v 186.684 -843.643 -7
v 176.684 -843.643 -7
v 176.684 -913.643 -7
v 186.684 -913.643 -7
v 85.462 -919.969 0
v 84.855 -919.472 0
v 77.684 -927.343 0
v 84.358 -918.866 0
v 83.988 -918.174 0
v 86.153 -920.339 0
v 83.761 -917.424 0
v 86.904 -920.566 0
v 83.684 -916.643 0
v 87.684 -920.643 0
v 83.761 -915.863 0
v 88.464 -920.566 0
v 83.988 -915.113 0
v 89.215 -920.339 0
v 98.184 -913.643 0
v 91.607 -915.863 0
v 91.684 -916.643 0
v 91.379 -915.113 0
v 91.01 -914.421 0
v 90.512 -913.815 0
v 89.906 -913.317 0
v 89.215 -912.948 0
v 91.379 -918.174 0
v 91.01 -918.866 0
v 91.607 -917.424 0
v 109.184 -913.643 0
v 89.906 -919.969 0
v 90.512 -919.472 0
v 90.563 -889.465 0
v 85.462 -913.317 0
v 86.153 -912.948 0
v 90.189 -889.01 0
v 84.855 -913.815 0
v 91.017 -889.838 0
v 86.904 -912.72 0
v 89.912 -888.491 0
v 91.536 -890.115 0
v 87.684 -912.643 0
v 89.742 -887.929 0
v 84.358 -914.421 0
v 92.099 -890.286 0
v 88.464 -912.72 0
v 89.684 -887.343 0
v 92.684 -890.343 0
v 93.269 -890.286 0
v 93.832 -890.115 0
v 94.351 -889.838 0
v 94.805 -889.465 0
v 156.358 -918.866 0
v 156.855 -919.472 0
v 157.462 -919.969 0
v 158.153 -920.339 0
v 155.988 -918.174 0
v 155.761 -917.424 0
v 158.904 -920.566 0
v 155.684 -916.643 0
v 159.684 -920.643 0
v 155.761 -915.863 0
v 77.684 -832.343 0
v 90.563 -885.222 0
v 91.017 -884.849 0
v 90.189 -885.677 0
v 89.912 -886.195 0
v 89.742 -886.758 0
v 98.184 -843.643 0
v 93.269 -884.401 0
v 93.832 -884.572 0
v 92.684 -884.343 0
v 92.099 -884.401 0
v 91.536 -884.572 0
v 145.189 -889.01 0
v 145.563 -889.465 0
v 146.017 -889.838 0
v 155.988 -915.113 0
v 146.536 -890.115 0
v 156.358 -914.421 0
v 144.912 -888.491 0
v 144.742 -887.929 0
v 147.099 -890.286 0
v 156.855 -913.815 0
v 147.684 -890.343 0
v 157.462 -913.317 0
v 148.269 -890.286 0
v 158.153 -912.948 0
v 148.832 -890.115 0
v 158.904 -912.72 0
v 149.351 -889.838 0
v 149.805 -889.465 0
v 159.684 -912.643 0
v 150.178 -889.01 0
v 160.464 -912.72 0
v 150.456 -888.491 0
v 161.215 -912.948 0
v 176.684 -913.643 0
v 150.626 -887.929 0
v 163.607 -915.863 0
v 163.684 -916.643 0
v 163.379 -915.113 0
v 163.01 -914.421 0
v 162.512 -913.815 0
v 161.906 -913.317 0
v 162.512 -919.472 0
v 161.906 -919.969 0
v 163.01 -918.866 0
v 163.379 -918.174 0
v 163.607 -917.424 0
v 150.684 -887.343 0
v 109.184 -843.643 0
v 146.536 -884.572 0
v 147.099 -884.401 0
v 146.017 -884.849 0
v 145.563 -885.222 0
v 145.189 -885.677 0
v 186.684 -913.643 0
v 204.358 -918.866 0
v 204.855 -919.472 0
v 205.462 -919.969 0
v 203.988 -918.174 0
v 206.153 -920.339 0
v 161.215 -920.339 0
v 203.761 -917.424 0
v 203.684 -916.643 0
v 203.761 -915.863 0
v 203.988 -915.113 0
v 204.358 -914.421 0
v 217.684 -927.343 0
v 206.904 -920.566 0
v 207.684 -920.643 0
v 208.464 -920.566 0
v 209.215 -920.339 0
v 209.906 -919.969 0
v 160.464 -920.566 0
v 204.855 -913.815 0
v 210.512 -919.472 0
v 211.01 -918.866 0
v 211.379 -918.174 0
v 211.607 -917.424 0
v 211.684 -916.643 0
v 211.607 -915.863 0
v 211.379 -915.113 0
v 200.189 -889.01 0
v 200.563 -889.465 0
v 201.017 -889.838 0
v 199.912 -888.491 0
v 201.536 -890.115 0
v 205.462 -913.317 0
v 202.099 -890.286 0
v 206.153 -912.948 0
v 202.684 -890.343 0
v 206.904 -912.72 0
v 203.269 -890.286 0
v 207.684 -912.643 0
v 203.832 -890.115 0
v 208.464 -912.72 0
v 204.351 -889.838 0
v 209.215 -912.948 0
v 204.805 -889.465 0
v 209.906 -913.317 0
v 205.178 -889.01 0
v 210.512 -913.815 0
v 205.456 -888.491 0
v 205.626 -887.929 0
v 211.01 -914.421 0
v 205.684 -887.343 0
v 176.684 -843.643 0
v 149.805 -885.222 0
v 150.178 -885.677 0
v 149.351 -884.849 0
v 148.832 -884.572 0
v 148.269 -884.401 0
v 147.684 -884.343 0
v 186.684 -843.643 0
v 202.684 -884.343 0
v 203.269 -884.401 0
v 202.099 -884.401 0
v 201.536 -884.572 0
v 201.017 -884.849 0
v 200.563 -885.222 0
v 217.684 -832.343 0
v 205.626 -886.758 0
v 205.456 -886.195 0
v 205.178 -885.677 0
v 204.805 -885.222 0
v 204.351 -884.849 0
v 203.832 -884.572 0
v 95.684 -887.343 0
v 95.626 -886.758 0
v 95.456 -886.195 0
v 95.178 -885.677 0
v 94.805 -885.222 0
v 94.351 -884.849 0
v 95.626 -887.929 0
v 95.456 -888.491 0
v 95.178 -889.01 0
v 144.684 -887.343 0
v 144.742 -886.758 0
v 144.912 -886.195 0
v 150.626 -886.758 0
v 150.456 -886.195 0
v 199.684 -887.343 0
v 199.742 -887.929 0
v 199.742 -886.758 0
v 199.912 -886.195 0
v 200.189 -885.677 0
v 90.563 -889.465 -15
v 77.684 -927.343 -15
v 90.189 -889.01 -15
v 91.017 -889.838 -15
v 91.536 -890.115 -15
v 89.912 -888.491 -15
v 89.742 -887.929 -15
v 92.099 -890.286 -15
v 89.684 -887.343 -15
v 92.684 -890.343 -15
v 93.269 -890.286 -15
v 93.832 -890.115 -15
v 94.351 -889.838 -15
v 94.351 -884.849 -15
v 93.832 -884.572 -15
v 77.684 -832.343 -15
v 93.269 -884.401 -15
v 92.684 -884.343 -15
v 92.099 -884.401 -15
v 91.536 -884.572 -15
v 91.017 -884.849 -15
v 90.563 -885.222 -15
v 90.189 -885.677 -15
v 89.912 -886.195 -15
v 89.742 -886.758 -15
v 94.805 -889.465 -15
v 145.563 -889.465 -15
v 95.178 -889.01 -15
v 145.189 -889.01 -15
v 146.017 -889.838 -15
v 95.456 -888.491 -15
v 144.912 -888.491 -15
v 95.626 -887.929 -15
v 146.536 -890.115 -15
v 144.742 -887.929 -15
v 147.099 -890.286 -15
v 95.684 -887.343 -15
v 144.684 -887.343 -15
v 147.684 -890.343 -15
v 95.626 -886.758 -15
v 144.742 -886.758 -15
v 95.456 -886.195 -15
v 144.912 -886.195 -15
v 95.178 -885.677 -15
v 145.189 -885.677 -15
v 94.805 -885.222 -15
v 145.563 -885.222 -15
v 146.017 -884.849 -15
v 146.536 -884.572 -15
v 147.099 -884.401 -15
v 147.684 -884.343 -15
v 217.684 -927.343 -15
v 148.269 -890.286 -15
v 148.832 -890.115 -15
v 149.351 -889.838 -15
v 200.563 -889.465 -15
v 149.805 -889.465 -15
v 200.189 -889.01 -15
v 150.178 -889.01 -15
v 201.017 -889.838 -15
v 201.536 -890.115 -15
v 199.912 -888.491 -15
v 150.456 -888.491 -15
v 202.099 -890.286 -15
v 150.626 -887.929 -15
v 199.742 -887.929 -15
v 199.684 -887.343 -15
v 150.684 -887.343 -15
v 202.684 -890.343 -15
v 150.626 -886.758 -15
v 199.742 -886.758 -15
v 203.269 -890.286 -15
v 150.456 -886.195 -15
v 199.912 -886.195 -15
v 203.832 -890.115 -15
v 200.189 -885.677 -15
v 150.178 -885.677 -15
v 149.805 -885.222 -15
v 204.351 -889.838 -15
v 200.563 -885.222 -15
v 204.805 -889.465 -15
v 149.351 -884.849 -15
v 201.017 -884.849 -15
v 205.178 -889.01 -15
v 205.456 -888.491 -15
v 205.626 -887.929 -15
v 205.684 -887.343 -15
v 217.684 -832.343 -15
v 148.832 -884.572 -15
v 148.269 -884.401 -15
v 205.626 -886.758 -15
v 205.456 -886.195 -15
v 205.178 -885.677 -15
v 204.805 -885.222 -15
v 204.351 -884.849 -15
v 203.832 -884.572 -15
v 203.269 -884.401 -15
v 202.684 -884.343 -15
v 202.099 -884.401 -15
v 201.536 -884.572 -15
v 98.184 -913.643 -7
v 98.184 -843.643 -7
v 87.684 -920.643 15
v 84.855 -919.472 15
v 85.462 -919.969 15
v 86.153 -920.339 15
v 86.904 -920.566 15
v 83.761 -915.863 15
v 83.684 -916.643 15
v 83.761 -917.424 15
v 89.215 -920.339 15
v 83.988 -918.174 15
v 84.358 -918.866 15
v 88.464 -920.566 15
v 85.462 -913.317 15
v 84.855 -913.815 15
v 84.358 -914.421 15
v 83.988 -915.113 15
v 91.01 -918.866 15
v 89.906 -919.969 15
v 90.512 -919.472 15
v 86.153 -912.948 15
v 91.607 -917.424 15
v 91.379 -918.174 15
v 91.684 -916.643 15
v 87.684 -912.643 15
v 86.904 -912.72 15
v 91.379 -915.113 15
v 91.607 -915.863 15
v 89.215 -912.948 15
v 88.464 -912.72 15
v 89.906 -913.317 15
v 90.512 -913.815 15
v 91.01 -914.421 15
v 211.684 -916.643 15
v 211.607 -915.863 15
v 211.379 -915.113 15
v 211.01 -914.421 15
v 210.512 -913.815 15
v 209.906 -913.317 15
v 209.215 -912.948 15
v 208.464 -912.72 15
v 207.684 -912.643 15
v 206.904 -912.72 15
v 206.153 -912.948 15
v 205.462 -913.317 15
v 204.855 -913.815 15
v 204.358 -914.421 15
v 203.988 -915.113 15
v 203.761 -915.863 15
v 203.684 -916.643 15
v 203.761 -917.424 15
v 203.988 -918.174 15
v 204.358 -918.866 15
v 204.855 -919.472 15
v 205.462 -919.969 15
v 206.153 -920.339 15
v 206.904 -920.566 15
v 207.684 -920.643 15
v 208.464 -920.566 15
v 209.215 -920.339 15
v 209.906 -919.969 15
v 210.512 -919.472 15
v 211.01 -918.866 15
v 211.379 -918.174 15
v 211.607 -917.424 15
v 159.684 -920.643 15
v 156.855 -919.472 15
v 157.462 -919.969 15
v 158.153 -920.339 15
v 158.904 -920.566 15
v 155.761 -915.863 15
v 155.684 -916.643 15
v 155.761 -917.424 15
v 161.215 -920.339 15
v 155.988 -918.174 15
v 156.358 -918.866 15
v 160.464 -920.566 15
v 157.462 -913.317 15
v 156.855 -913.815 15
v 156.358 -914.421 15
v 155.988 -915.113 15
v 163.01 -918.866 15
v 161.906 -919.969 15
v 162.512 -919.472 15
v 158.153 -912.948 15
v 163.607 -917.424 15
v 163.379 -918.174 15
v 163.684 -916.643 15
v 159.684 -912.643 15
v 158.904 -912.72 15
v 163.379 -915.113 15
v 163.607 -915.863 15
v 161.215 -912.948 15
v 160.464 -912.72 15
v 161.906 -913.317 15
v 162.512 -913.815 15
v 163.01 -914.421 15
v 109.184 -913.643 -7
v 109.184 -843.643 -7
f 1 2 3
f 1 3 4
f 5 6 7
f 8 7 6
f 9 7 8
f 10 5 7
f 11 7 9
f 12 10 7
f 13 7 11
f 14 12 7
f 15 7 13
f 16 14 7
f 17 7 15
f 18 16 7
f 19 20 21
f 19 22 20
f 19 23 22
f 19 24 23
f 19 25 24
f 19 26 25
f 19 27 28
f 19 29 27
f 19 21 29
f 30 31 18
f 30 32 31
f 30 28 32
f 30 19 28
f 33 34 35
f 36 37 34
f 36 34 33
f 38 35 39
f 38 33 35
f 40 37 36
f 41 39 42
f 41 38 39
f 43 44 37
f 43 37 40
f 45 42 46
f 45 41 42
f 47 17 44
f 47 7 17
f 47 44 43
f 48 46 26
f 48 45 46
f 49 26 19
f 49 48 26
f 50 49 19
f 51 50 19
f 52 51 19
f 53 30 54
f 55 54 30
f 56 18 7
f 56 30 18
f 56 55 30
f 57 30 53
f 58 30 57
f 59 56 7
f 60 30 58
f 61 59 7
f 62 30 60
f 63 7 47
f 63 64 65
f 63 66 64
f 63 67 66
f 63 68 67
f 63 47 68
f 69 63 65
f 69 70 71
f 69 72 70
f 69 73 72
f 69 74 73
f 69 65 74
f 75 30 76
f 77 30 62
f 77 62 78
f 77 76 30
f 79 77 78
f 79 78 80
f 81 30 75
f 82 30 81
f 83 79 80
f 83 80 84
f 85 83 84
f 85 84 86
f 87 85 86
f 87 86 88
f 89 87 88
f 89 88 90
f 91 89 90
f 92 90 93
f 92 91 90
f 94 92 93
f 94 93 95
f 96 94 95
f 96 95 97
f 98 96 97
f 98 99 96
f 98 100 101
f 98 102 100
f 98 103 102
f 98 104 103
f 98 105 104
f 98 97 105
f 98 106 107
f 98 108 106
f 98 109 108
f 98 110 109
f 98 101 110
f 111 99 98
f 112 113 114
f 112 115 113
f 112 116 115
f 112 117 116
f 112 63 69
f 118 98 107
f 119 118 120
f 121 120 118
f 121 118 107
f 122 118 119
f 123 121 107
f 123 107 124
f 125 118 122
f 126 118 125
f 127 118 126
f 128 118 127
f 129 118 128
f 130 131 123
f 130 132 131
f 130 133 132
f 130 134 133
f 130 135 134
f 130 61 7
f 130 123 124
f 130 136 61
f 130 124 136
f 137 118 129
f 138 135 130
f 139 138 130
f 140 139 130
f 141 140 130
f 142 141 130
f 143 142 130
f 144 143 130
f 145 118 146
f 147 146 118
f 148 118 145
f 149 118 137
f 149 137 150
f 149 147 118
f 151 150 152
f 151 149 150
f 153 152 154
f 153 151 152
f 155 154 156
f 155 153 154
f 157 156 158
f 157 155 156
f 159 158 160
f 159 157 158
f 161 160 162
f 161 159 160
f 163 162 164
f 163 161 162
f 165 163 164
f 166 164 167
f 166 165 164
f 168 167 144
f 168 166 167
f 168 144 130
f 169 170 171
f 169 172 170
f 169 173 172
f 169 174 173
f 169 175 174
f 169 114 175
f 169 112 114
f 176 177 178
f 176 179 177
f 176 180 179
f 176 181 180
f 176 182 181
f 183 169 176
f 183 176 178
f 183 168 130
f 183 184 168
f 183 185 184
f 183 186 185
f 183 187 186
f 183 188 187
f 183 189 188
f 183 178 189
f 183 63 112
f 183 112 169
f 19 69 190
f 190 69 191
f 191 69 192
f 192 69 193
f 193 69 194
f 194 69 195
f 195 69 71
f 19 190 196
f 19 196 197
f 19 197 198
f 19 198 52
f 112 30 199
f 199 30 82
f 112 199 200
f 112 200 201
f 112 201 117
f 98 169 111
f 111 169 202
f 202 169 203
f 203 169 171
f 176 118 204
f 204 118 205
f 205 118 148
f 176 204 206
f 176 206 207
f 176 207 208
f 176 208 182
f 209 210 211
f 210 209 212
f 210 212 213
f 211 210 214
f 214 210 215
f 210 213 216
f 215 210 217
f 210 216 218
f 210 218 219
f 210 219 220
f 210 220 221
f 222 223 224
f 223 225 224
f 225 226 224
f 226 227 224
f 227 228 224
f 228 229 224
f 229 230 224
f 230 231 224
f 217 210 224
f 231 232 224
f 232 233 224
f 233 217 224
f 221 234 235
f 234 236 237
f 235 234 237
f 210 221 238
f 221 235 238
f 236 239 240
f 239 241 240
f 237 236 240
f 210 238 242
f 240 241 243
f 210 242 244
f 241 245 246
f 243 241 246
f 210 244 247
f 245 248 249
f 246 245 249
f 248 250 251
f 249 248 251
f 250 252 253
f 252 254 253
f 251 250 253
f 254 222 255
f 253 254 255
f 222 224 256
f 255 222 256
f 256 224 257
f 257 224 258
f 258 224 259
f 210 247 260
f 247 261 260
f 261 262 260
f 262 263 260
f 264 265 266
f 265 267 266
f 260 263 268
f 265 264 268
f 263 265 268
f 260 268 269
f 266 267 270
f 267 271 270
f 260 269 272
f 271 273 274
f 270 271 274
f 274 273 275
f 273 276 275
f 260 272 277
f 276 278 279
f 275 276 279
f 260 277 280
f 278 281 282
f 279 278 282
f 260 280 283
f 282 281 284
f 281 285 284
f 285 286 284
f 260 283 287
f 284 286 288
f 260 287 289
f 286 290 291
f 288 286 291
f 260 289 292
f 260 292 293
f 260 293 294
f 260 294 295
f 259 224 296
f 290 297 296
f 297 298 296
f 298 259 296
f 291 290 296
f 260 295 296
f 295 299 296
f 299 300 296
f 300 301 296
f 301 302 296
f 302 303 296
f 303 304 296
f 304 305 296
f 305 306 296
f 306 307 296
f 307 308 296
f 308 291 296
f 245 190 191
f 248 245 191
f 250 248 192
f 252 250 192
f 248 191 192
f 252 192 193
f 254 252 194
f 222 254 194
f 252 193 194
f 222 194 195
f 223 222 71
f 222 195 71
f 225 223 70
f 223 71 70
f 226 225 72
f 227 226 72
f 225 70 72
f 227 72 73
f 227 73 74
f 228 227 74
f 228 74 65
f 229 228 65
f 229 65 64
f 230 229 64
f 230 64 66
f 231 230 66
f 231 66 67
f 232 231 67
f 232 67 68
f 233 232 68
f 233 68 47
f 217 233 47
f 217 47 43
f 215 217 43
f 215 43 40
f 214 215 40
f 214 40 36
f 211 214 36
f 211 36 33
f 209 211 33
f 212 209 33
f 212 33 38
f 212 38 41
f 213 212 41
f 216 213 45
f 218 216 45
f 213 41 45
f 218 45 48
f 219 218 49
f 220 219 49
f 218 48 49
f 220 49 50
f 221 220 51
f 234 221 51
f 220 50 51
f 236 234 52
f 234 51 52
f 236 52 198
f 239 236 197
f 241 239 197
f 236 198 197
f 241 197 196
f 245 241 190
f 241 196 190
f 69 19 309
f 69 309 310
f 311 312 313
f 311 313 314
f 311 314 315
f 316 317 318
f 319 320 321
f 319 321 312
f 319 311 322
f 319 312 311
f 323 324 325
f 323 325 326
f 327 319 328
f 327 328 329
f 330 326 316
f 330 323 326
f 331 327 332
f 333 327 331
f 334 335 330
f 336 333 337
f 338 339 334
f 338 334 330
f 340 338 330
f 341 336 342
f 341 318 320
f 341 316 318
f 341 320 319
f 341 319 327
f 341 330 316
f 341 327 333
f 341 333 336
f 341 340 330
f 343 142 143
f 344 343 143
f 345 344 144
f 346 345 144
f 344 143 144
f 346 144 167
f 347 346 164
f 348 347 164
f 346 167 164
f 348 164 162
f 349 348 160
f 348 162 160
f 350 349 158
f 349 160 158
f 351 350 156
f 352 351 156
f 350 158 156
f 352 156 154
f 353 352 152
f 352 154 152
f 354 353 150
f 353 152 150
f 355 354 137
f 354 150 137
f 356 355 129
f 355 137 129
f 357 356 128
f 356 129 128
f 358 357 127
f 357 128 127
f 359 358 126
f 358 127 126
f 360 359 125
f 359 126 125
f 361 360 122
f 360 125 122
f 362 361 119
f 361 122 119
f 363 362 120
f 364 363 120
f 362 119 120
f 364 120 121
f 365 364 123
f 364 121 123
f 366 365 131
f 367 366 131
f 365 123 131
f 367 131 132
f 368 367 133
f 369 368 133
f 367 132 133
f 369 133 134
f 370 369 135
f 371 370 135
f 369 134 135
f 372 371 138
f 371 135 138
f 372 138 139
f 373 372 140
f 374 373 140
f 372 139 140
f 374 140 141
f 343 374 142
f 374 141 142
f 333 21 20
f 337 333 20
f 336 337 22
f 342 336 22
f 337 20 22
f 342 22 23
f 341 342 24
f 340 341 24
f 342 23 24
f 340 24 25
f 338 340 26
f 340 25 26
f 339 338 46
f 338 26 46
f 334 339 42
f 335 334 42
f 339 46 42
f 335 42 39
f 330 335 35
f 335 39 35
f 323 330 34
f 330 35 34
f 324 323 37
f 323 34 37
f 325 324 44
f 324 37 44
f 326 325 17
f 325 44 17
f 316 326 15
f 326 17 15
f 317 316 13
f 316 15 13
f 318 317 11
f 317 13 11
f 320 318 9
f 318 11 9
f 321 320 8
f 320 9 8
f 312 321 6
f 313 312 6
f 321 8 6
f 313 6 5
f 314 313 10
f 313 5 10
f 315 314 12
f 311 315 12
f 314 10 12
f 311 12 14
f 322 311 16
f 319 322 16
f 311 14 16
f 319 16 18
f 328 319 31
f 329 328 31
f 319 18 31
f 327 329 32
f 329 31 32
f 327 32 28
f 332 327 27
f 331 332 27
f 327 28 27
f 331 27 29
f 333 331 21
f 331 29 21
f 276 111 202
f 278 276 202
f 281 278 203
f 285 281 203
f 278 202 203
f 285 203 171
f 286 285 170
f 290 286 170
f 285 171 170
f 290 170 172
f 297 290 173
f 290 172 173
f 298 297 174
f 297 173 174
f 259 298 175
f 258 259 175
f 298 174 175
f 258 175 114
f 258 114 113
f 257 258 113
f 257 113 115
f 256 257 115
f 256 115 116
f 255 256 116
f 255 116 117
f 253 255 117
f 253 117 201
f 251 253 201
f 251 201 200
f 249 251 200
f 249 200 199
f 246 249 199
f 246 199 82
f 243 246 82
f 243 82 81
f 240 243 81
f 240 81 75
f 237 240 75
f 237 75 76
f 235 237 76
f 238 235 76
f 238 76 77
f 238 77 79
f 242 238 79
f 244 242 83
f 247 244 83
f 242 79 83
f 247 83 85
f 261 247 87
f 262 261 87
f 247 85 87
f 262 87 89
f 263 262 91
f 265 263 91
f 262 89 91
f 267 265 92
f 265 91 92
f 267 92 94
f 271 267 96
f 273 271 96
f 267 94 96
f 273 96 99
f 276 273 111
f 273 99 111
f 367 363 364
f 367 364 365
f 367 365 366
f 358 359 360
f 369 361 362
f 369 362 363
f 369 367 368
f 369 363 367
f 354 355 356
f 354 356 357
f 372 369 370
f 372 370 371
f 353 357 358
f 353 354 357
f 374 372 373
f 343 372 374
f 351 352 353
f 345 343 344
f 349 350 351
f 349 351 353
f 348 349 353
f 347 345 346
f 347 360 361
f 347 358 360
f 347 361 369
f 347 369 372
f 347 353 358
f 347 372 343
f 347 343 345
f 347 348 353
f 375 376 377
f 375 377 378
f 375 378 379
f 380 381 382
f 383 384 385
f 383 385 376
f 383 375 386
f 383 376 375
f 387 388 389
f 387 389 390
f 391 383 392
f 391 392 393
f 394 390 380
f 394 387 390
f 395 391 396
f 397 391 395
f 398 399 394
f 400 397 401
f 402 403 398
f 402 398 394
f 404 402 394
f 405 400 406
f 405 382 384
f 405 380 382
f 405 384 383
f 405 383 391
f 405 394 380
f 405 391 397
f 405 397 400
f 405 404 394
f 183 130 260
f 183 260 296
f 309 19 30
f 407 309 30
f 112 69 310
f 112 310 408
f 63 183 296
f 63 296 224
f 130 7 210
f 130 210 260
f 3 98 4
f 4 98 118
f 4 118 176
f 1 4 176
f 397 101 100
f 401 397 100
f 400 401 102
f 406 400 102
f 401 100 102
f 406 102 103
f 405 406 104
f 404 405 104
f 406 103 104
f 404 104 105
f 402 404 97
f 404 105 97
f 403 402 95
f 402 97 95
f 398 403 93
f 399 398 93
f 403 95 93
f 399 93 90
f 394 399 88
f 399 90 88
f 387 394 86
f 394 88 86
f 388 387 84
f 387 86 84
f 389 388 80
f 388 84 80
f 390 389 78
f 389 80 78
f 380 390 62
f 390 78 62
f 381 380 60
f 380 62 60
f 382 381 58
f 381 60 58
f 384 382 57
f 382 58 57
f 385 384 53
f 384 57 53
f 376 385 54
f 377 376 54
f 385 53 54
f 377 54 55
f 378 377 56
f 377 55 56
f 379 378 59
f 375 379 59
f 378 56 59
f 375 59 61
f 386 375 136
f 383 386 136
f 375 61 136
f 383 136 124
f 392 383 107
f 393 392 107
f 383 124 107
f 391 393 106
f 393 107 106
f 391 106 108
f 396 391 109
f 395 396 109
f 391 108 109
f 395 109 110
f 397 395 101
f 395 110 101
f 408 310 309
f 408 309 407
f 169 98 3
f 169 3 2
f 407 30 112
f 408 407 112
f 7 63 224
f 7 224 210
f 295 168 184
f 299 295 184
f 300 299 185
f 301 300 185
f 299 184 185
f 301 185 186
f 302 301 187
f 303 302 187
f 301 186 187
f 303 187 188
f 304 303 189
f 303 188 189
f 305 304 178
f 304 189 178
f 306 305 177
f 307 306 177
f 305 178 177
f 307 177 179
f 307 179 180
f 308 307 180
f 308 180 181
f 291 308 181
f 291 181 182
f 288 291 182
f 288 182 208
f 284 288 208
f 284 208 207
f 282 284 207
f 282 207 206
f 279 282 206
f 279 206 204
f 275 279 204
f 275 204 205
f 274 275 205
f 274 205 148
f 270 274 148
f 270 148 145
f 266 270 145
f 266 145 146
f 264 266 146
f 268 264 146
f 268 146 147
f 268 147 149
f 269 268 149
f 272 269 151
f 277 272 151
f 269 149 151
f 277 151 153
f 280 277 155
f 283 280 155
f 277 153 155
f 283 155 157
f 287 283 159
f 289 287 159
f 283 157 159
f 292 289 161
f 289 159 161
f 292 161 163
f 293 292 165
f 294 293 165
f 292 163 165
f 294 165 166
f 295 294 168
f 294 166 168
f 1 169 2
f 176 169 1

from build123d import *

# Parameters (mm, degrees)
SKETCH1_W                = 92
SKETCH1_H                = 77
SKETCH1_R                = 4
BOSS_EXTRUDE1_DEPTH      = 15
SKETCH1_3_R              = 4
BOSS_EXTRUDE2_DEPTH      = 15
BOSS_EXTRUDE2_DEPTH_BACK = 15
SKETCH2_R                = 3
CUT_EXTRUDE1_DEPTH       = 16
SKETCH2_3_W              = 11
SKETCH2_3_H              = 70
SKETCH2_3_W_2            = 10
CUT_EXTRUDE2_DEPTH       = 7


with BuildPart() as part:
    # Sketch1 → Boss-Extrude1 (new body)
    with BuildSketch(Plane.XY):
        with Locations((123.683888311, -870.843310138)):
            Rectangle(SKETCH1_W, SKETCH1_H)
        Polygon((169.683888311, -927.343310138), (217.683888311, -927.343310138), (217.683888311, -832.343310138), (169.683888311, -832.343310138), (169.683888311, -920.343310138), align=None)
        with Locations((207.683888311, -916.643310138)):
            Circle(SKETCH1_R, mode=Mode.SUBTRACT)
        Polygon((77.683888311, -909.343310138), (77.683888311, -920.343310138), (77.683888311, -927.343310138), (169.683888311, -927.343310138), (169.683888311, -920.343310138), (169.683888311, -909.343310138), align=None)
        with Locations((87.683888311, -916.643310138)):
            Circle(SKETCH1_R, mode=Mode.SUBTRACT)
        with Locations((159.683888311, -916.643310138)):
            Circle(SKETCH1_R, mode=Mode.SUBTRACT)
    extrude(amount=-BOSS_EXTRUDE1_DEPTH)

    # Sketch1_3 → Boss-Extrude2 (add, two sides)
    with BuildSketch(Plane.XY) as boss_extrude2_sk:
        with Locations((87.683888311, -916.643310138)):
            Circle(SKETCH1_3_R)
        with Locations((207.683888311, -916.643310138)):
            Circle(SKETCH1_3_R)
        with Locations((159.683888311, -916.643310138)):
            Circle(SKETCH1_3_R)
    extrude(amount=BOSS_EXTRUDE2_DEPTH)
    extrude(boss_extrude2_sk.sketch, amount=-BOSS_EXTRUDE2_DEPTH_BACK)

    # Sketch2 → Cut-Extrude1 (cut, through all)
    with BuildSketch(Plane.XY):
        with Locations((147.683888311, -887.343310138)):
            Circle(SKETCH2_R)
        with Locations((202.683888311, -887.343310138)):
            Circle(SKETCH2_R)
        with Locations((92.683888311, -887.343310138)):
            Circle(SKETCH2_R)
    extrude(amount=-CUT_EXTRUDE1_DEPTH, mode=Mode.SUBTRACT)

    # Sketch2_3 → Cut-Extrude2 (cut)
    with BuildSketch(Plane.XY):
        with Locations((103.683888311, -878.643310138)):
            Rectangle(SKETCH2_3_W, SKETCH2_3_H)
        with Locations((181.683888311, -878.643310138)):
            Rectangle(SKETCH2_3_W_2, SKETCH2_3_H)
    extrude(amount=-CUT_EXTRUDE2_DEPTH, mode=Mode.SUBTRACT)


solid = part.part
